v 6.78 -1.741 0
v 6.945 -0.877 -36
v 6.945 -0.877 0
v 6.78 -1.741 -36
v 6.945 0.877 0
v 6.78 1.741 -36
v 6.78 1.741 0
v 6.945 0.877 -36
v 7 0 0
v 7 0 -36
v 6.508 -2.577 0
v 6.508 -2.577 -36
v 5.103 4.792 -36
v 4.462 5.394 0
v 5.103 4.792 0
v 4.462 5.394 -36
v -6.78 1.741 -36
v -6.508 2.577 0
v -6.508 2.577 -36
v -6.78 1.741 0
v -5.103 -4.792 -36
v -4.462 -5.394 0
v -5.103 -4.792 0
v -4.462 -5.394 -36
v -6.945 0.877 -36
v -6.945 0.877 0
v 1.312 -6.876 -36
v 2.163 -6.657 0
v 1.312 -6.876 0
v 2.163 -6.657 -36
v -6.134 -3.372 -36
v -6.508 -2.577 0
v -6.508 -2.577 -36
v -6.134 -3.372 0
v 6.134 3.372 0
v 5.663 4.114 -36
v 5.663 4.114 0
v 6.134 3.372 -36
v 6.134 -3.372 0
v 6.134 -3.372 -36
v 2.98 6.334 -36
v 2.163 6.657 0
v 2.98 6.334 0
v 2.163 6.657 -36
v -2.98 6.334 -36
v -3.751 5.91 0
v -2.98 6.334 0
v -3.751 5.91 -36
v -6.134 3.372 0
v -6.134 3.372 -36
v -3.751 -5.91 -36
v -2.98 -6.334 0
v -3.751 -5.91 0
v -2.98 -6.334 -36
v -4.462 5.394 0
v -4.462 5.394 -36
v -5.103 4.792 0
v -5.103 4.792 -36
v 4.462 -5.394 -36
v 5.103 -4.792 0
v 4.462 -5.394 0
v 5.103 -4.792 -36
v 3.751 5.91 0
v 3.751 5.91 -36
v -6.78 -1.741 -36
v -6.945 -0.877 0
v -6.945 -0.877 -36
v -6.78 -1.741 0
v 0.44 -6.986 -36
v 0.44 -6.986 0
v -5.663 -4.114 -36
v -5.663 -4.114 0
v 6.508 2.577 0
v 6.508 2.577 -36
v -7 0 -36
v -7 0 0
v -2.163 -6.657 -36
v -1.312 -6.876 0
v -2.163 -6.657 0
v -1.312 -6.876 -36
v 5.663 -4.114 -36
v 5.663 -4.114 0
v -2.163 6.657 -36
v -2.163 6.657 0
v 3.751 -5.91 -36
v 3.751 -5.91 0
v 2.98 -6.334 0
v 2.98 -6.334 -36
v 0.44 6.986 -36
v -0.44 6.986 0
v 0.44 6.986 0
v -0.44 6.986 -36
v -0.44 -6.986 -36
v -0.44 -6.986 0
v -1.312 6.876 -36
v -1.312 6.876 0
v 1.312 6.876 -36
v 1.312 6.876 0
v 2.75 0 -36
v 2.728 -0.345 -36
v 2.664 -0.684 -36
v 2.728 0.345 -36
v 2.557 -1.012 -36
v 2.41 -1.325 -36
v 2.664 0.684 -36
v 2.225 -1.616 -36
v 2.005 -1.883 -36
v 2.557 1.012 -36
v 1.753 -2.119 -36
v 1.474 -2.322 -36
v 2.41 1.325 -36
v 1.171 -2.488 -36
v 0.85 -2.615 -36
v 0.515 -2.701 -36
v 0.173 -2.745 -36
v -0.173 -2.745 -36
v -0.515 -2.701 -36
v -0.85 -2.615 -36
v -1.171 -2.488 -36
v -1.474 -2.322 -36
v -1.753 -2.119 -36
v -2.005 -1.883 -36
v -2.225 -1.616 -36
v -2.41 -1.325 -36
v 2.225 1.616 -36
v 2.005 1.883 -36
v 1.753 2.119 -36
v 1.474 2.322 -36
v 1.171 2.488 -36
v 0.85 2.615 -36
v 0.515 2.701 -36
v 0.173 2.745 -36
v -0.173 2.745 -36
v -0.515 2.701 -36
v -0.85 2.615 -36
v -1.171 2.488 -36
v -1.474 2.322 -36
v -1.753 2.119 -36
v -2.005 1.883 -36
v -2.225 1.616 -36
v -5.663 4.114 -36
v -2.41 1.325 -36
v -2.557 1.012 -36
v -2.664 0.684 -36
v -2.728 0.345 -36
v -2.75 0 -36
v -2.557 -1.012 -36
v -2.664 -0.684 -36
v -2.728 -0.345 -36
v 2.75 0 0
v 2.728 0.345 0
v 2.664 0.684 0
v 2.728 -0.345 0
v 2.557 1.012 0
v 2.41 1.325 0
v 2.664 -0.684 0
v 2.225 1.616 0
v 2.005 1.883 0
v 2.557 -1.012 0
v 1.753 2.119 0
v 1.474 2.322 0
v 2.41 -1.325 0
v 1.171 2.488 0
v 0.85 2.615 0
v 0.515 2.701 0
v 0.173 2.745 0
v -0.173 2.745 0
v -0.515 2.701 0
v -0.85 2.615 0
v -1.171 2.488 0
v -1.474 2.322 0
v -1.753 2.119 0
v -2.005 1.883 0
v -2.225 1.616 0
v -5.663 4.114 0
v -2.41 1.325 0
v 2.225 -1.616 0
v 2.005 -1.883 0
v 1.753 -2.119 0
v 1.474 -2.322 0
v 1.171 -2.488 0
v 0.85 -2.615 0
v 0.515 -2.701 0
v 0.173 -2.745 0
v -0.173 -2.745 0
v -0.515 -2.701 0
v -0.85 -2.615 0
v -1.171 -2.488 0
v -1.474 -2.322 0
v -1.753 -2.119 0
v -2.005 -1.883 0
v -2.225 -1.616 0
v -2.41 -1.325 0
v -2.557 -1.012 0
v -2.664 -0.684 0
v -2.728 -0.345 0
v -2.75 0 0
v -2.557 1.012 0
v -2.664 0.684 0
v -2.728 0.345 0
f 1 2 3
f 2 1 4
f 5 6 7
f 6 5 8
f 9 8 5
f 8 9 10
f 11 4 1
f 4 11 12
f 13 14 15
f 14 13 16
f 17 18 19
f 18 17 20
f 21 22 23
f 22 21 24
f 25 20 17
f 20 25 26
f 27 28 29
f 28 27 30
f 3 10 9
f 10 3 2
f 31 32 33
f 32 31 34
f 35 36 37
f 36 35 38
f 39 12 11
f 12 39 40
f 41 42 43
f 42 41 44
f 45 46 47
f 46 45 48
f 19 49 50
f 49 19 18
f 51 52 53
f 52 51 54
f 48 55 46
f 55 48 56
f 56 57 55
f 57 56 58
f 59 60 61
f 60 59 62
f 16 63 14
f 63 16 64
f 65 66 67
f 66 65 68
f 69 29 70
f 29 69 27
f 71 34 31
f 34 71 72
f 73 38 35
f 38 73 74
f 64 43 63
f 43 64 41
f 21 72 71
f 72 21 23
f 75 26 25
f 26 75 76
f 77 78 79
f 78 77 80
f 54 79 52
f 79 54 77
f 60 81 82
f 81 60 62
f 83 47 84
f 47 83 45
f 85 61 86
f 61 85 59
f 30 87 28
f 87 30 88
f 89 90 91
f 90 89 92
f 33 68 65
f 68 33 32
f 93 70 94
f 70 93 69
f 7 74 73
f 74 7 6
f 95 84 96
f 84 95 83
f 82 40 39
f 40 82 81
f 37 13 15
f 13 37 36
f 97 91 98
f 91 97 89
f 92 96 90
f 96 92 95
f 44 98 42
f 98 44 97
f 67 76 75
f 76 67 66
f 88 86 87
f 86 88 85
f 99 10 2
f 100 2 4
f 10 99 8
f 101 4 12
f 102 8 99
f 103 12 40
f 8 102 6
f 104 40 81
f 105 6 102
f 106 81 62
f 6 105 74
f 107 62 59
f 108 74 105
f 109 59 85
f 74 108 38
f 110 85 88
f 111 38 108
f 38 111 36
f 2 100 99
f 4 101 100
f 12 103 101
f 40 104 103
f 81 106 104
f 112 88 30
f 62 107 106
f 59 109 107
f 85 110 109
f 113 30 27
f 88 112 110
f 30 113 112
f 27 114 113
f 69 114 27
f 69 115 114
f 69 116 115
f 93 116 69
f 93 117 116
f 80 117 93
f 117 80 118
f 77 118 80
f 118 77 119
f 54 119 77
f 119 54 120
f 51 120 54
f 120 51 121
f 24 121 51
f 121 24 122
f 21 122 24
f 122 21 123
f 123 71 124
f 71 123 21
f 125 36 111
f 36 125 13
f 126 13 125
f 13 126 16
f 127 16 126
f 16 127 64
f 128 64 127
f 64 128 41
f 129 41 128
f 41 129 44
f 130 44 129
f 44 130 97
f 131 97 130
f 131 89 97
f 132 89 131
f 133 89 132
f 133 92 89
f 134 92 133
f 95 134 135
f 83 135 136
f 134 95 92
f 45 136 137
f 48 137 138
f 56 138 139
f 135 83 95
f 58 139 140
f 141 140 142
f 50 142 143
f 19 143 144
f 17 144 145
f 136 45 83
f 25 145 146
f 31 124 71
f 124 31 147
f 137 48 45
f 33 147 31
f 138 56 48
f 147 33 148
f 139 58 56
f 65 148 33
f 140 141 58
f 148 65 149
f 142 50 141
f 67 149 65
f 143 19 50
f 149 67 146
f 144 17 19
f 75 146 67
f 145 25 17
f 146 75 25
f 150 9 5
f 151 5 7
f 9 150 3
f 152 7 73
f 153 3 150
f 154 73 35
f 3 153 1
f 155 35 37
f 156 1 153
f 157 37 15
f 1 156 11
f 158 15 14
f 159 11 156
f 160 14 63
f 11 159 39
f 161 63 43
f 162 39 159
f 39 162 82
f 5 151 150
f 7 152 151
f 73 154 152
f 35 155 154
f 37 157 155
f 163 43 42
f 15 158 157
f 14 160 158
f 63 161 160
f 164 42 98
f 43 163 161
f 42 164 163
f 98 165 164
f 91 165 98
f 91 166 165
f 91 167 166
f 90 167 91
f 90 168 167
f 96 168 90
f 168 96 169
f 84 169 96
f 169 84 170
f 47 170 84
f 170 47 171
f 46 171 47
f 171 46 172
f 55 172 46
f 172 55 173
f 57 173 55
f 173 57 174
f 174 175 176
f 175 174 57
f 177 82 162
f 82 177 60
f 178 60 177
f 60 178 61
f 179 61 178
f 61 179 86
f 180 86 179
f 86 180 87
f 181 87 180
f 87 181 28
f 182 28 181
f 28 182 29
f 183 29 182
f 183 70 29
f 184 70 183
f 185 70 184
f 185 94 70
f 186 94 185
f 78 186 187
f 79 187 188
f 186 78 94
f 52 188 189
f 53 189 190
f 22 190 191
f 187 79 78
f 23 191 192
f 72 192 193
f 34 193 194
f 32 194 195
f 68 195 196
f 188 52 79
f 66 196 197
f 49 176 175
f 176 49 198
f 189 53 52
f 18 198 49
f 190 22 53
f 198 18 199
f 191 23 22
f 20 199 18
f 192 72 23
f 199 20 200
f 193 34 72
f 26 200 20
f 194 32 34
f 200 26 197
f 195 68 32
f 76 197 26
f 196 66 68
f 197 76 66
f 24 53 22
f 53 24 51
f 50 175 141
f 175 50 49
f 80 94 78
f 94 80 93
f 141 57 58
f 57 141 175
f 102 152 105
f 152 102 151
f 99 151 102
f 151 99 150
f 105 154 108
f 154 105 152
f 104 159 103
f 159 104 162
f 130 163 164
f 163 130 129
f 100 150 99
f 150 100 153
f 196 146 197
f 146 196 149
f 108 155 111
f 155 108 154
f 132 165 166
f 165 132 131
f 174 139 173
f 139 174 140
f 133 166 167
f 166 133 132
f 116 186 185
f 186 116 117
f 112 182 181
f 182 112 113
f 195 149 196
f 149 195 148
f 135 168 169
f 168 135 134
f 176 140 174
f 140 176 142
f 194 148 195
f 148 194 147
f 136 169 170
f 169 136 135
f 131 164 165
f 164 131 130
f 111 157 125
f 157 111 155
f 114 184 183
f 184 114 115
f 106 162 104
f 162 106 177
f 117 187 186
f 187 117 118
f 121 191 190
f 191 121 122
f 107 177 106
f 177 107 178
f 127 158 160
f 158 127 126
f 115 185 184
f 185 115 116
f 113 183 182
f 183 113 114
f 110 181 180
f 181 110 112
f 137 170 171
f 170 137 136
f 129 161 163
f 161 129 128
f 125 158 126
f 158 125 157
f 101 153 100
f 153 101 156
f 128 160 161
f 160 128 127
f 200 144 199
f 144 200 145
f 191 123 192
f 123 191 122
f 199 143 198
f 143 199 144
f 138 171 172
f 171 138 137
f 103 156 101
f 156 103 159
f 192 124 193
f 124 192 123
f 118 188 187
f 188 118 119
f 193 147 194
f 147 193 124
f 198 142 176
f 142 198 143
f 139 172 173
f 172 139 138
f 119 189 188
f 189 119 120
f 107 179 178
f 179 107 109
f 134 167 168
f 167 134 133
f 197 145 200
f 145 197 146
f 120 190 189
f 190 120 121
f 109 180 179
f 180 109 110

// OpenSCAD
$fn = 50;


difference() {
	union() {
		translate(v = [0, 0, -36.0000000000]) {
			cylinder(h = 36, r = 7.0000000000);
		}
		cylinder(h = 0, r = 10.0000000000);
	}
	union() {
		#translate(v = [0, 0, -36]) {
			cylinder(h = 36, r = 2.7500000000);
		}
	}
}
